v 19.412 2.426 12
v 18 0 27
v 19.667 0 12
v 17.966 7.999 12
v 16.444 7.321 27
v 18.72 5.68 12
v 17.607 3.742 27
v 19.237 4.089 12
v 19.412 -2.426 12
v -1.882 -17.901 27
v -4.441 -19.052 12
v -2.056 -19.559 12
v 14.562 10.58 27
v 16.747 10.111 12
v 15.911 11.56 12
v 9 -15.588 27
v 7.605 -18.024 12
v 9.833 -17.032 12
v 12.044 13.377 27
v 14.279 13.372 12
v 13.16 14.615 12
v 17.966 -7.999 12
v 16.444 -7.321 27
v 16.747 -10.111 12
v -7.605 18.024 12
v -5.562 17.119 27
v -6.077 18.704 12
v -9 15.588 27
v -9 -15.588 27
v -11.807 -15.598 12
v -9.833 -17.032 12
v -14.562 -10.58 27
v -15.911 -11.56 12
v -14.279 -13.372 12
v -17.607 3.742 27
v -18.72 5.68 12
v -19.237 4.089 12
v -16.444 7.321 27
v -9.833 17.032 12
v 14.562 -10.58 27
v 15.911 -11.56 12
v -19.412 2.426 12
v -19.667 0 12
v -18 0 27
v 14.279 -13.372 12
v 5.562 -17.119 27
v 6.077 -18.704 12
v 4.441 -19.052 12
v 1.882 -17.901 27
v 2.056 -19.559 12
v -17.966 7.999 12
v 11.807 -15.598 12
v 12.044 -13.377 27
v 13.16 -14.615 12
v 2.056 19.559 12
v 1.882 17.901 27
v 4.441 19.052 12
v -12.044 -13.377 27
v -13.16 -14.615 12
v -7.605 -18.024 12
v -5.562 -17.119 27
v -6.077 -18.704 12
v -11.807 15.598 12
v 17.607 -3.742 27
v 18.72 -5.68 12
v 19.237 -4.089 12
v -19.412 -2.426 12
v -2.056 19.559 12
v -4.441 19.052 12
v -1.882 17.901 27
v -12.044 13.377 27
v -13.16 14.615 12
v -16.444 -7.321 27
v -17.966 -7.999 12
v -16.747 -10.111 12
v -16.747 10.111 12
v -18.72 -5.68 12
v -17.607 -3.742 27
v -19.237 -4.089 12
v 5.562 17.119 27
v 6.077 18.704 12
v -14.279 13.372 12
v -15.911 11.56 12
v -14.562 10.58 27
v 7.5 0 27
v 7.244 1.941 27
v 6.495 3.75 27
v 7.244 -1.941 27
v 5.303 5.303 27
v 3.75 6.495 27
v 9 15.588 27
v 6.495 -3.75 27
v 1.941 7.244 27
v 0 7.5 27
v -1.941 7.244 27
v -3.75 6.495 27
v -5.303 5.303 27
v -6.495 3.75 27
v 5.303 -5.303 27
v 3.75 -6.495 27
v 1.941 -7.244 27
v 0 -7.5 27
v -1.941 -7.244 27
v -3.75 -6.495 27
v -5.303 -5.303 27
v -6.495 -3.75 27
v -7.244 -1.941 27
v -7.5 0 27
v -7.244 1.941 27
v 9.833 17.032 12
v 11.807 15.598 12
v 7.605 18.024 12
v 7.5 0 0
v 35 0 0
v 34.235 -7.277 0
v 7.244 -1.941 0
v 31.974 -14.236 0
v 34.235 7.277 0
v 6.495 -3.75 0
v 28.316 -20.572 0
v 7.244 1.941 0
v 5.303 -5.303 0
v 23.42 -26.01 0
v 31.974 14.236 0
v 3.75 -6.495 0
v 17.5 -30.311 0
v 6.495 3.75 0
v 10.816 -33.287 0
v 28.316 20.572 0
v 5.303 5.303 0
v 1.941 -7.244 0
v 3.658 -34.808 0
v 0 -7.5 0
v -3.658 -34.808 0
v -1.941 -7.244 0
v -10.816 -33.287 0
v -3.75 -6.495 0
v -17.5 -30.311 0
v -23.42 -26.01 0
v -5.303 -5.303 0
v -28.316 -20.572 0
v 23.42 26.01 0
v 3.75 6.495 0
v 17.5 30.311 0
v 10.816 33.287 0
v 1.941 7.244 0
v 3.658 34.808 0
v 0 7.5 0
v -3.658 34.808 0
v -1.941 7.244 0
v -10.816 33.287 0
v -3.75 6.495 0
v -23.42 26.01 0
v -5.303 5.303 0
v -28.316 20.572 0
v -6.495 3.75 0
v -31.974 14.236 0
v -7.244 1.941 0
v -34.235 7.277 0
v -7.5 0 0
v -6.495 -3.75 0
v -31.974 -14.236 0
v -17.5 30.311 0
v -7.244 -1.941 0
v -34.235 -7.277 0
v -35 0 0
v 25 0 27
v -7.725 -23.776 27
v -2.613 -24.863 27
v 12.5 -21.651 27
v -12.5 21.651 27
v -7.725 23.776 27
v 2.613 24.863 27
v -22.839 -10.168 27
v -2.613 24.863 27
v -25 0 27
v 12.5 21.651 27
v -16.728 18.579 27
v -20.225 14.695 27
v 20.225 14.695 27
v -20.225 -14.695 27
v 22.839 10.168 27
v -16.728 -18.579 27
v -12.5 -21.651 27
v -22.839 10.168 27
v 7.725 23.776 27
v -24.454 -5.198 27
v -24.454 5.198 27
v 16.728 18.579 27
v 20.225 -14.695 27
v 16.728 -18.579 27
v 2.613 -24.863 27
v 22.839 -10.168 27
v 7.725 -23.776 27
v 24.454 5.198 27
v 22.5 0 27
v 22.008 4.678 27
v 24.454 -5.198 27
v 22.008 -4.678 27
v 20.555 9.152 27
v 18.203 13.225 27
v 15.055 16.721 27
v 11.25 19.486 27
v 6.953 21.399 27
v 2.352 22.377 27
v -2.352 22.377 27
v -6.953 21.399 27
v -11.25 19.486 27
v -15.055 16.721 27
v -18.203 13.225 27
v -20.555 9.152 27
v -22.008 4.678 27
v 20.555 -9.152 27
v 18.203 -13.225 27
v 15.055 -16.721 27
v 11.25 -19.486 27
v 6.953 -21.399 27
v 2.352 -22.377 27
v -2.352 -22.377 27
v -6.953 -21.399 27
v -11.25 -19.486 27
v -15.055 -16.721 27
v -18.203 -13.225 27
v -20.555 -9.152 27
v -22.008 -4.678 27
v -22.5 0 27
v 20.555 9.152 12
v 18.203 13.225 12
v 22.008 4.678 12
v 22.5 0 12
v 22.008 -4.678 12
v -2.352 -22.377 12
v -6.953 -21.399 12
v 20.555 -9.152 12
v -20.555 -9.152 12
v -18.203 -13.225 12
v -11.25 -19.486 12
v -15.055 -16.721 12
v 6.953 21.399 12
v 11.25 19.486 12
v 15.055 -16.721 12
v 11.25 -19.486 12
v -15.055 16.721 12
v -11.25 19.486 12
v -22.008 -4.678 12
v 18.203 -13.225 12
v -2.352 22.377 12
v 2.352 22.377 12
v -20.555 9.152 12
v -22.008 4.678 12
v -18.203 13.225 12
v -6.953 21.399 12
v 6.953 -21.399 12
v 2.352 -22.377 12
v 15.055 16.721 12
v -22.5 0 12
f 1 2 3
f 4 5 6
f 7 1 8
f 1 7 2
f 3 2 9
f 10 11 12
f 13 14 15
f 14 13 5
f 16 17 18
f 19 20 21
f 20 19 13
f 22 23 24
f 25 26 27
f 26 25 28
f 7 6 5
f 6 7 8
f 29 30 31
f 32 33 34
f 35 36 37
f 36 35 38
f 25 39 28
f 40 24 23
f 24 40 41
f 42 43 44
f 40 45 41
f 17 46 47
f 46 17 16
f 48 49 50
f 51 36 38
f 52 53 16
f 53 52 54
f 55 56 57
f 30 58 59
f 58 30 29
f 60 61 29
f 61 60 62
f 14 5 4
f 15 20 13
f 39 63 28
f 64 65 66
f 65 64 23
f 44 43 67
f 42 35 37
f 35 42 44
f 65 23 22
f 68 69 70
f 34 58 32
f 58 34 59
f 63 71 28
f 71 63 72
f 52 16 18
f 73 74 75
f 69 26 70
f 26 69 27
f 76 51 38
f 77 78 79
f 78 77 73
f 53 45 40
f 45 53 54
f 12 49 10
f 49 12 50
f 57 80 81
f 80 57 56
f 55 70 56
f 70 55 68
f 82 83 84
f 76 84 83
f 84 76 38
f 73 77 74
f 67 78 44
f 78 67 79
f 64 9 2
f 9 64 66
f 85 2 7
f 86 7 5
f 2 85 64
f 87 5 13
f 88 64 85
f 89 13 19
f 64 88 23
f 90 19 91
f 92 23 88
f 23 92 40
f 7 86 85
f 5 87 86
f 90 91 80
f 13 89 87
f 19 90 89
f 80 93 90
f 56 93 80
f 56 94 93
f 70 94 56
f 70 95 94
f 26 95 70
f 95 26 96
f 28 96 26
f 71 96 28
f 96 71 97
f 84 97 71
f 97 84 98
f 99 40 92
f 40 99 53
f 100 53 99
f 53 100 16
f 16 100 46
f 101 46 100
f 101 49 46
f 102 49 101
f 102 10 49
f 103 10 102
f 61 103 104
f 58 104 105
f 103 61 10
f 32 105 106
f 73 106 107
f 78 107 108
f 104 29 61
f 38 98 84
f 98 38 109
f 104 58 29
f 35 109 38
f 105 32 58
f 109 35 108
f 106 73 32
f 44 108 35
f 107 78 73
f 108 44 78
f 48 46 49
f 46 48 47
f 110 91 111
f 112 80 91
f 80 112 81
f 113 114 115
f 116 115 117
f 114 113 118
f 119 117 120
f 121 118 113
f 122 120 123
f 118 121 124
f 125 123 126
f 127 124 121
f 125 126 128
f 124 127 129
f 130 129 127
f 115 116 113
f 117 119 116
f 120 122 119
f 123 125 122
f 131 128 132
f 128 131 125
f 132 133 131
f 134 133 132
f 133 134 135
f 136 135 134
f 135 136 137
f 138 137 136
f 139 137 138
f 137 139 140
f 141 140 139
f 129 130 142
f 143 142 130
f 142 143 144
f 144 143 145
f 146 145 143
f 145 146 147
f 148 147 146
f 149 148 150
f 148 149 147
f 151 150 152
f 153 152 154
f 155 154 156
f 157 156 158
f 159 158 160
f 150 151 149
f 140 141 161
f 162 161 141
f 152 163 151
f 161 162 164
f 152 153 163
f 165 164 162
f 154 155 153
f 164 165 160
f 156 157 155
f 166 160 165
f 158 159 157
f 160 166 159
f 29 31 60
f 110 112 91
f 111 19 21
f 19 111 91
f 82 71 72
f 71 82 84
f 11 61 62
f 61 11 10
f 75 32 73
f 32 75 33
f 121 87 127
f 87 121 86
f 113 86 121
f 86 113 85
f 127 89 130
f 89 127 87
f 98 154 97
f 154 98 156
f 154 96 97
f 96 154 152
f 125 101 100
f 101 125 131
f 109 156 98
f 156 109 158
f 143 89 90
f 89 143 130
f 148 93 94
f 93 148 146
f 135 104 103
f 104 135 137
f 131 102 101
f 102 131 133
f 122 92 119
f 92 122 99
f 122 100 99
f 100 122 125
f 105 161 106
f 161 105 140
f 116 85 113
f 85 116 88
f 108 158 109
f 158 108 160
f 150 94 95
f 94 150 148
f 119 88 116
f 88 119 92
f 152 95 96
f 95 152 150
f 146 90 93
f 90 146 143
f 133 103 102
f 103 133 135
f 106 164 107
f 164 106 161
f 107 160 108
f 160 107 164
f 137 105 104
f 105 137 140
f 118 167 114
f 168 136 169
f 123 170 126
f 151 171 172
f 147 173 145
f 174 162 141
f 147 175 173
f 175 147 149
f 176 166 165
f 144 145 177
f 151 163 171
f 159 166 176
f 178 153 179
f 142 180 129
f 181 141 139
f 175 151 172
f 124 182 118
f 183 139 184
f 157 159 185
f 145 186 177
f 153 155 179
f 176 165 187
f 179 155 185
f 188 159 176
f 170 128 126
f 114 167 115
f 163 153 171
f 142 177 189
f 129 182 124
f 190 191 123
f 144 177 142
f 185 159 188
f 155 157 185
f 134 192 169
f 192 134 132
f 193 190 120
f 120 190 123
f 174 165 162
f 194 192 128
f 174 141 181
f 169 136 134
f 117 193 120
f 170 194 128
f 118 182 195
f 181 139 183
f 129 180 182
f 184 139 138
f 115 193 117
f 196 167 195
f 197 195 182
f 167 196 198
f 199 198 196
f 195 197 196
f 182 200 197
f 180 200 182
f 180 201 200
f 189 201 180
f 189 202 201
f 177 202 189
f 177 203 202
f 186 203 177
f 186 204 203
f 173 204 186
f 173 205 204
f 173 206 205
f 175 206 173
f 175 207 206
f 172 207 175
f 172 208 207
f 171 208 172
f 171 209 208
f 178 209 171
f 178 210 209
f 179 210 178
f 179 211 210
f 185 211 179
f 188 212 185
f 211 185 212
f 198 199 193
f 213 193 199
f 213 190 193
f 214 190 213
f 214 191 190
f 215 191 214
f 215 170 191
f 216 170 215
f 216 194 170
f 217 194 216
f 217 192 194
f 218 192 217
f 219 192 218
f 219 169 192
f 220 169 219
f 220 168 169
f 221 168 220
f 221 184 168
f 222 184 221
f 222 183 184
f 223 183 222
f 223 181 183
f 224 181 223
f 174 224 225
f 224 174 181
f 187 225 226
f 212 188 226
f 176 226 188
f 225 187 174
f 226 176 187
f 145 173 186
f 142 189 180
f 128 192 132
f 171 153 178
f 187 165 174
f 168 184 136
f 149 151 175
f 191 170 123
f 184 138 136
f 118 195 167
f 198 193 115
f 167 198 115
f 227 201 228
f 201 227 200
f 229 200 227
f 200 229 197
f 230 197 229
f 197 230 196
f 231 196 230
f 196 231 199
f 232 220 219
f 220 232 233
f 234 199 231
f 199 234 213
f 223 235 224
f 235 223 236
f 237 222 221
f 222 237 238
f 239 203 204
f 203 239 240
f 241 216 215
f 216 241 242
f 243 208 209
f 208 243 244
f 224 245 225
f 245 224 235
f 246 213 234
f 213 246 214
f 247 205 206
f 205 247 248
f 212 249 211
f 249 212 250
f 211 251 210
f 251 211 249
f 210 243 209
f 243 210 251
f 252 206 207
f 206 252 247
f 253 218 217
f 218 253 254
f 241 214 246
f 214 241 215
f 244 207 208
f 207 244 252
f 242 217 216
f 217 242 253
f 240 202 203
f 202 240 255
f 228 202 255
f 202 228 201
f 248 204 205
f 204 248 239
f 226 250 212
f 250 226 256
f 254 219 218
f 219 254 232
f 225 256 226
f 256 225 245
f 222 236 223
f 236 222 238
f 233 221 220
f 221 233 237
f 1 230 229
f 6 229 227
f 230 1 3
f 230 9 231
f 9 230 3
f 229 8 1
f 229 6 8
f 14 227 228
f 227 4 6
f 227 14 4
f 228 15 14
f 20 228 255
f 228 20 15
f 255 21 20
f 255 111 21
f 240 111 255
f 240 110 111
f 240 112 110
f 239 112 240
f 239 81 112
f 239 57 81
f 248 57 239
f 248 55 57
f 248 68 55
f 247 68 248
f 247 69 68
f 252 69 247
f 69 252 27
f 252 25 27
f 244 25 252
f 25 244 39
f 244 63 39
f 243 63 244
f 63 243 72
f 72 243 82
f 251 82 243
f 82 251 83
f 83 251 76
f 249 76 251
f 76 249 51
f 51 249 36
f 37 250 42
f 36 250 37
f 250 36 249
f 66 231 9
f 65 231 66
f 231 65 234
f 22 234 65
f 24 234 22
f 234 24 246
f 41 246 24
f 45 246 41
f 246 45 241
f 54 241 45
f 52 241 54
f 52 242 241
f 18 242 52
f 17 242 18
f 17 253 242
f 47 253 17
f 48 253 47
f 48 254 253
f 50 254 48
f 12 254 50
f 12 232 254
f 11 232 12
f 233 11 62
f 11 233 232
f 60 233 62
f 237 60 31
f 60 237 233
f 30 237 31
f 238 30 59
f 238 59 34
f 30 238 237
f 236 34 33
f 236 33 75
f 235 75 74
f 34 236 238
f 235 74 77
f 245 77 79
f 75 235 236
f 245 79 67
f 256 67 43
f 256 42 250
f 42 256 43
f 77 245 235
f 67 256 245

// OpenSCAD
union() {
    difference() {
        cylinder(h=27, d2=36, d1=42);
        cylinder(h=27, d=15);
    }
    difference() {
        cylinder(h=27, d1=70, d2=50);
        cylinder(h=27, d=45);
    }
    difference() {
        cylinder(h=12, d=45);
        cylinder(h=12, d=15);
    }
}
